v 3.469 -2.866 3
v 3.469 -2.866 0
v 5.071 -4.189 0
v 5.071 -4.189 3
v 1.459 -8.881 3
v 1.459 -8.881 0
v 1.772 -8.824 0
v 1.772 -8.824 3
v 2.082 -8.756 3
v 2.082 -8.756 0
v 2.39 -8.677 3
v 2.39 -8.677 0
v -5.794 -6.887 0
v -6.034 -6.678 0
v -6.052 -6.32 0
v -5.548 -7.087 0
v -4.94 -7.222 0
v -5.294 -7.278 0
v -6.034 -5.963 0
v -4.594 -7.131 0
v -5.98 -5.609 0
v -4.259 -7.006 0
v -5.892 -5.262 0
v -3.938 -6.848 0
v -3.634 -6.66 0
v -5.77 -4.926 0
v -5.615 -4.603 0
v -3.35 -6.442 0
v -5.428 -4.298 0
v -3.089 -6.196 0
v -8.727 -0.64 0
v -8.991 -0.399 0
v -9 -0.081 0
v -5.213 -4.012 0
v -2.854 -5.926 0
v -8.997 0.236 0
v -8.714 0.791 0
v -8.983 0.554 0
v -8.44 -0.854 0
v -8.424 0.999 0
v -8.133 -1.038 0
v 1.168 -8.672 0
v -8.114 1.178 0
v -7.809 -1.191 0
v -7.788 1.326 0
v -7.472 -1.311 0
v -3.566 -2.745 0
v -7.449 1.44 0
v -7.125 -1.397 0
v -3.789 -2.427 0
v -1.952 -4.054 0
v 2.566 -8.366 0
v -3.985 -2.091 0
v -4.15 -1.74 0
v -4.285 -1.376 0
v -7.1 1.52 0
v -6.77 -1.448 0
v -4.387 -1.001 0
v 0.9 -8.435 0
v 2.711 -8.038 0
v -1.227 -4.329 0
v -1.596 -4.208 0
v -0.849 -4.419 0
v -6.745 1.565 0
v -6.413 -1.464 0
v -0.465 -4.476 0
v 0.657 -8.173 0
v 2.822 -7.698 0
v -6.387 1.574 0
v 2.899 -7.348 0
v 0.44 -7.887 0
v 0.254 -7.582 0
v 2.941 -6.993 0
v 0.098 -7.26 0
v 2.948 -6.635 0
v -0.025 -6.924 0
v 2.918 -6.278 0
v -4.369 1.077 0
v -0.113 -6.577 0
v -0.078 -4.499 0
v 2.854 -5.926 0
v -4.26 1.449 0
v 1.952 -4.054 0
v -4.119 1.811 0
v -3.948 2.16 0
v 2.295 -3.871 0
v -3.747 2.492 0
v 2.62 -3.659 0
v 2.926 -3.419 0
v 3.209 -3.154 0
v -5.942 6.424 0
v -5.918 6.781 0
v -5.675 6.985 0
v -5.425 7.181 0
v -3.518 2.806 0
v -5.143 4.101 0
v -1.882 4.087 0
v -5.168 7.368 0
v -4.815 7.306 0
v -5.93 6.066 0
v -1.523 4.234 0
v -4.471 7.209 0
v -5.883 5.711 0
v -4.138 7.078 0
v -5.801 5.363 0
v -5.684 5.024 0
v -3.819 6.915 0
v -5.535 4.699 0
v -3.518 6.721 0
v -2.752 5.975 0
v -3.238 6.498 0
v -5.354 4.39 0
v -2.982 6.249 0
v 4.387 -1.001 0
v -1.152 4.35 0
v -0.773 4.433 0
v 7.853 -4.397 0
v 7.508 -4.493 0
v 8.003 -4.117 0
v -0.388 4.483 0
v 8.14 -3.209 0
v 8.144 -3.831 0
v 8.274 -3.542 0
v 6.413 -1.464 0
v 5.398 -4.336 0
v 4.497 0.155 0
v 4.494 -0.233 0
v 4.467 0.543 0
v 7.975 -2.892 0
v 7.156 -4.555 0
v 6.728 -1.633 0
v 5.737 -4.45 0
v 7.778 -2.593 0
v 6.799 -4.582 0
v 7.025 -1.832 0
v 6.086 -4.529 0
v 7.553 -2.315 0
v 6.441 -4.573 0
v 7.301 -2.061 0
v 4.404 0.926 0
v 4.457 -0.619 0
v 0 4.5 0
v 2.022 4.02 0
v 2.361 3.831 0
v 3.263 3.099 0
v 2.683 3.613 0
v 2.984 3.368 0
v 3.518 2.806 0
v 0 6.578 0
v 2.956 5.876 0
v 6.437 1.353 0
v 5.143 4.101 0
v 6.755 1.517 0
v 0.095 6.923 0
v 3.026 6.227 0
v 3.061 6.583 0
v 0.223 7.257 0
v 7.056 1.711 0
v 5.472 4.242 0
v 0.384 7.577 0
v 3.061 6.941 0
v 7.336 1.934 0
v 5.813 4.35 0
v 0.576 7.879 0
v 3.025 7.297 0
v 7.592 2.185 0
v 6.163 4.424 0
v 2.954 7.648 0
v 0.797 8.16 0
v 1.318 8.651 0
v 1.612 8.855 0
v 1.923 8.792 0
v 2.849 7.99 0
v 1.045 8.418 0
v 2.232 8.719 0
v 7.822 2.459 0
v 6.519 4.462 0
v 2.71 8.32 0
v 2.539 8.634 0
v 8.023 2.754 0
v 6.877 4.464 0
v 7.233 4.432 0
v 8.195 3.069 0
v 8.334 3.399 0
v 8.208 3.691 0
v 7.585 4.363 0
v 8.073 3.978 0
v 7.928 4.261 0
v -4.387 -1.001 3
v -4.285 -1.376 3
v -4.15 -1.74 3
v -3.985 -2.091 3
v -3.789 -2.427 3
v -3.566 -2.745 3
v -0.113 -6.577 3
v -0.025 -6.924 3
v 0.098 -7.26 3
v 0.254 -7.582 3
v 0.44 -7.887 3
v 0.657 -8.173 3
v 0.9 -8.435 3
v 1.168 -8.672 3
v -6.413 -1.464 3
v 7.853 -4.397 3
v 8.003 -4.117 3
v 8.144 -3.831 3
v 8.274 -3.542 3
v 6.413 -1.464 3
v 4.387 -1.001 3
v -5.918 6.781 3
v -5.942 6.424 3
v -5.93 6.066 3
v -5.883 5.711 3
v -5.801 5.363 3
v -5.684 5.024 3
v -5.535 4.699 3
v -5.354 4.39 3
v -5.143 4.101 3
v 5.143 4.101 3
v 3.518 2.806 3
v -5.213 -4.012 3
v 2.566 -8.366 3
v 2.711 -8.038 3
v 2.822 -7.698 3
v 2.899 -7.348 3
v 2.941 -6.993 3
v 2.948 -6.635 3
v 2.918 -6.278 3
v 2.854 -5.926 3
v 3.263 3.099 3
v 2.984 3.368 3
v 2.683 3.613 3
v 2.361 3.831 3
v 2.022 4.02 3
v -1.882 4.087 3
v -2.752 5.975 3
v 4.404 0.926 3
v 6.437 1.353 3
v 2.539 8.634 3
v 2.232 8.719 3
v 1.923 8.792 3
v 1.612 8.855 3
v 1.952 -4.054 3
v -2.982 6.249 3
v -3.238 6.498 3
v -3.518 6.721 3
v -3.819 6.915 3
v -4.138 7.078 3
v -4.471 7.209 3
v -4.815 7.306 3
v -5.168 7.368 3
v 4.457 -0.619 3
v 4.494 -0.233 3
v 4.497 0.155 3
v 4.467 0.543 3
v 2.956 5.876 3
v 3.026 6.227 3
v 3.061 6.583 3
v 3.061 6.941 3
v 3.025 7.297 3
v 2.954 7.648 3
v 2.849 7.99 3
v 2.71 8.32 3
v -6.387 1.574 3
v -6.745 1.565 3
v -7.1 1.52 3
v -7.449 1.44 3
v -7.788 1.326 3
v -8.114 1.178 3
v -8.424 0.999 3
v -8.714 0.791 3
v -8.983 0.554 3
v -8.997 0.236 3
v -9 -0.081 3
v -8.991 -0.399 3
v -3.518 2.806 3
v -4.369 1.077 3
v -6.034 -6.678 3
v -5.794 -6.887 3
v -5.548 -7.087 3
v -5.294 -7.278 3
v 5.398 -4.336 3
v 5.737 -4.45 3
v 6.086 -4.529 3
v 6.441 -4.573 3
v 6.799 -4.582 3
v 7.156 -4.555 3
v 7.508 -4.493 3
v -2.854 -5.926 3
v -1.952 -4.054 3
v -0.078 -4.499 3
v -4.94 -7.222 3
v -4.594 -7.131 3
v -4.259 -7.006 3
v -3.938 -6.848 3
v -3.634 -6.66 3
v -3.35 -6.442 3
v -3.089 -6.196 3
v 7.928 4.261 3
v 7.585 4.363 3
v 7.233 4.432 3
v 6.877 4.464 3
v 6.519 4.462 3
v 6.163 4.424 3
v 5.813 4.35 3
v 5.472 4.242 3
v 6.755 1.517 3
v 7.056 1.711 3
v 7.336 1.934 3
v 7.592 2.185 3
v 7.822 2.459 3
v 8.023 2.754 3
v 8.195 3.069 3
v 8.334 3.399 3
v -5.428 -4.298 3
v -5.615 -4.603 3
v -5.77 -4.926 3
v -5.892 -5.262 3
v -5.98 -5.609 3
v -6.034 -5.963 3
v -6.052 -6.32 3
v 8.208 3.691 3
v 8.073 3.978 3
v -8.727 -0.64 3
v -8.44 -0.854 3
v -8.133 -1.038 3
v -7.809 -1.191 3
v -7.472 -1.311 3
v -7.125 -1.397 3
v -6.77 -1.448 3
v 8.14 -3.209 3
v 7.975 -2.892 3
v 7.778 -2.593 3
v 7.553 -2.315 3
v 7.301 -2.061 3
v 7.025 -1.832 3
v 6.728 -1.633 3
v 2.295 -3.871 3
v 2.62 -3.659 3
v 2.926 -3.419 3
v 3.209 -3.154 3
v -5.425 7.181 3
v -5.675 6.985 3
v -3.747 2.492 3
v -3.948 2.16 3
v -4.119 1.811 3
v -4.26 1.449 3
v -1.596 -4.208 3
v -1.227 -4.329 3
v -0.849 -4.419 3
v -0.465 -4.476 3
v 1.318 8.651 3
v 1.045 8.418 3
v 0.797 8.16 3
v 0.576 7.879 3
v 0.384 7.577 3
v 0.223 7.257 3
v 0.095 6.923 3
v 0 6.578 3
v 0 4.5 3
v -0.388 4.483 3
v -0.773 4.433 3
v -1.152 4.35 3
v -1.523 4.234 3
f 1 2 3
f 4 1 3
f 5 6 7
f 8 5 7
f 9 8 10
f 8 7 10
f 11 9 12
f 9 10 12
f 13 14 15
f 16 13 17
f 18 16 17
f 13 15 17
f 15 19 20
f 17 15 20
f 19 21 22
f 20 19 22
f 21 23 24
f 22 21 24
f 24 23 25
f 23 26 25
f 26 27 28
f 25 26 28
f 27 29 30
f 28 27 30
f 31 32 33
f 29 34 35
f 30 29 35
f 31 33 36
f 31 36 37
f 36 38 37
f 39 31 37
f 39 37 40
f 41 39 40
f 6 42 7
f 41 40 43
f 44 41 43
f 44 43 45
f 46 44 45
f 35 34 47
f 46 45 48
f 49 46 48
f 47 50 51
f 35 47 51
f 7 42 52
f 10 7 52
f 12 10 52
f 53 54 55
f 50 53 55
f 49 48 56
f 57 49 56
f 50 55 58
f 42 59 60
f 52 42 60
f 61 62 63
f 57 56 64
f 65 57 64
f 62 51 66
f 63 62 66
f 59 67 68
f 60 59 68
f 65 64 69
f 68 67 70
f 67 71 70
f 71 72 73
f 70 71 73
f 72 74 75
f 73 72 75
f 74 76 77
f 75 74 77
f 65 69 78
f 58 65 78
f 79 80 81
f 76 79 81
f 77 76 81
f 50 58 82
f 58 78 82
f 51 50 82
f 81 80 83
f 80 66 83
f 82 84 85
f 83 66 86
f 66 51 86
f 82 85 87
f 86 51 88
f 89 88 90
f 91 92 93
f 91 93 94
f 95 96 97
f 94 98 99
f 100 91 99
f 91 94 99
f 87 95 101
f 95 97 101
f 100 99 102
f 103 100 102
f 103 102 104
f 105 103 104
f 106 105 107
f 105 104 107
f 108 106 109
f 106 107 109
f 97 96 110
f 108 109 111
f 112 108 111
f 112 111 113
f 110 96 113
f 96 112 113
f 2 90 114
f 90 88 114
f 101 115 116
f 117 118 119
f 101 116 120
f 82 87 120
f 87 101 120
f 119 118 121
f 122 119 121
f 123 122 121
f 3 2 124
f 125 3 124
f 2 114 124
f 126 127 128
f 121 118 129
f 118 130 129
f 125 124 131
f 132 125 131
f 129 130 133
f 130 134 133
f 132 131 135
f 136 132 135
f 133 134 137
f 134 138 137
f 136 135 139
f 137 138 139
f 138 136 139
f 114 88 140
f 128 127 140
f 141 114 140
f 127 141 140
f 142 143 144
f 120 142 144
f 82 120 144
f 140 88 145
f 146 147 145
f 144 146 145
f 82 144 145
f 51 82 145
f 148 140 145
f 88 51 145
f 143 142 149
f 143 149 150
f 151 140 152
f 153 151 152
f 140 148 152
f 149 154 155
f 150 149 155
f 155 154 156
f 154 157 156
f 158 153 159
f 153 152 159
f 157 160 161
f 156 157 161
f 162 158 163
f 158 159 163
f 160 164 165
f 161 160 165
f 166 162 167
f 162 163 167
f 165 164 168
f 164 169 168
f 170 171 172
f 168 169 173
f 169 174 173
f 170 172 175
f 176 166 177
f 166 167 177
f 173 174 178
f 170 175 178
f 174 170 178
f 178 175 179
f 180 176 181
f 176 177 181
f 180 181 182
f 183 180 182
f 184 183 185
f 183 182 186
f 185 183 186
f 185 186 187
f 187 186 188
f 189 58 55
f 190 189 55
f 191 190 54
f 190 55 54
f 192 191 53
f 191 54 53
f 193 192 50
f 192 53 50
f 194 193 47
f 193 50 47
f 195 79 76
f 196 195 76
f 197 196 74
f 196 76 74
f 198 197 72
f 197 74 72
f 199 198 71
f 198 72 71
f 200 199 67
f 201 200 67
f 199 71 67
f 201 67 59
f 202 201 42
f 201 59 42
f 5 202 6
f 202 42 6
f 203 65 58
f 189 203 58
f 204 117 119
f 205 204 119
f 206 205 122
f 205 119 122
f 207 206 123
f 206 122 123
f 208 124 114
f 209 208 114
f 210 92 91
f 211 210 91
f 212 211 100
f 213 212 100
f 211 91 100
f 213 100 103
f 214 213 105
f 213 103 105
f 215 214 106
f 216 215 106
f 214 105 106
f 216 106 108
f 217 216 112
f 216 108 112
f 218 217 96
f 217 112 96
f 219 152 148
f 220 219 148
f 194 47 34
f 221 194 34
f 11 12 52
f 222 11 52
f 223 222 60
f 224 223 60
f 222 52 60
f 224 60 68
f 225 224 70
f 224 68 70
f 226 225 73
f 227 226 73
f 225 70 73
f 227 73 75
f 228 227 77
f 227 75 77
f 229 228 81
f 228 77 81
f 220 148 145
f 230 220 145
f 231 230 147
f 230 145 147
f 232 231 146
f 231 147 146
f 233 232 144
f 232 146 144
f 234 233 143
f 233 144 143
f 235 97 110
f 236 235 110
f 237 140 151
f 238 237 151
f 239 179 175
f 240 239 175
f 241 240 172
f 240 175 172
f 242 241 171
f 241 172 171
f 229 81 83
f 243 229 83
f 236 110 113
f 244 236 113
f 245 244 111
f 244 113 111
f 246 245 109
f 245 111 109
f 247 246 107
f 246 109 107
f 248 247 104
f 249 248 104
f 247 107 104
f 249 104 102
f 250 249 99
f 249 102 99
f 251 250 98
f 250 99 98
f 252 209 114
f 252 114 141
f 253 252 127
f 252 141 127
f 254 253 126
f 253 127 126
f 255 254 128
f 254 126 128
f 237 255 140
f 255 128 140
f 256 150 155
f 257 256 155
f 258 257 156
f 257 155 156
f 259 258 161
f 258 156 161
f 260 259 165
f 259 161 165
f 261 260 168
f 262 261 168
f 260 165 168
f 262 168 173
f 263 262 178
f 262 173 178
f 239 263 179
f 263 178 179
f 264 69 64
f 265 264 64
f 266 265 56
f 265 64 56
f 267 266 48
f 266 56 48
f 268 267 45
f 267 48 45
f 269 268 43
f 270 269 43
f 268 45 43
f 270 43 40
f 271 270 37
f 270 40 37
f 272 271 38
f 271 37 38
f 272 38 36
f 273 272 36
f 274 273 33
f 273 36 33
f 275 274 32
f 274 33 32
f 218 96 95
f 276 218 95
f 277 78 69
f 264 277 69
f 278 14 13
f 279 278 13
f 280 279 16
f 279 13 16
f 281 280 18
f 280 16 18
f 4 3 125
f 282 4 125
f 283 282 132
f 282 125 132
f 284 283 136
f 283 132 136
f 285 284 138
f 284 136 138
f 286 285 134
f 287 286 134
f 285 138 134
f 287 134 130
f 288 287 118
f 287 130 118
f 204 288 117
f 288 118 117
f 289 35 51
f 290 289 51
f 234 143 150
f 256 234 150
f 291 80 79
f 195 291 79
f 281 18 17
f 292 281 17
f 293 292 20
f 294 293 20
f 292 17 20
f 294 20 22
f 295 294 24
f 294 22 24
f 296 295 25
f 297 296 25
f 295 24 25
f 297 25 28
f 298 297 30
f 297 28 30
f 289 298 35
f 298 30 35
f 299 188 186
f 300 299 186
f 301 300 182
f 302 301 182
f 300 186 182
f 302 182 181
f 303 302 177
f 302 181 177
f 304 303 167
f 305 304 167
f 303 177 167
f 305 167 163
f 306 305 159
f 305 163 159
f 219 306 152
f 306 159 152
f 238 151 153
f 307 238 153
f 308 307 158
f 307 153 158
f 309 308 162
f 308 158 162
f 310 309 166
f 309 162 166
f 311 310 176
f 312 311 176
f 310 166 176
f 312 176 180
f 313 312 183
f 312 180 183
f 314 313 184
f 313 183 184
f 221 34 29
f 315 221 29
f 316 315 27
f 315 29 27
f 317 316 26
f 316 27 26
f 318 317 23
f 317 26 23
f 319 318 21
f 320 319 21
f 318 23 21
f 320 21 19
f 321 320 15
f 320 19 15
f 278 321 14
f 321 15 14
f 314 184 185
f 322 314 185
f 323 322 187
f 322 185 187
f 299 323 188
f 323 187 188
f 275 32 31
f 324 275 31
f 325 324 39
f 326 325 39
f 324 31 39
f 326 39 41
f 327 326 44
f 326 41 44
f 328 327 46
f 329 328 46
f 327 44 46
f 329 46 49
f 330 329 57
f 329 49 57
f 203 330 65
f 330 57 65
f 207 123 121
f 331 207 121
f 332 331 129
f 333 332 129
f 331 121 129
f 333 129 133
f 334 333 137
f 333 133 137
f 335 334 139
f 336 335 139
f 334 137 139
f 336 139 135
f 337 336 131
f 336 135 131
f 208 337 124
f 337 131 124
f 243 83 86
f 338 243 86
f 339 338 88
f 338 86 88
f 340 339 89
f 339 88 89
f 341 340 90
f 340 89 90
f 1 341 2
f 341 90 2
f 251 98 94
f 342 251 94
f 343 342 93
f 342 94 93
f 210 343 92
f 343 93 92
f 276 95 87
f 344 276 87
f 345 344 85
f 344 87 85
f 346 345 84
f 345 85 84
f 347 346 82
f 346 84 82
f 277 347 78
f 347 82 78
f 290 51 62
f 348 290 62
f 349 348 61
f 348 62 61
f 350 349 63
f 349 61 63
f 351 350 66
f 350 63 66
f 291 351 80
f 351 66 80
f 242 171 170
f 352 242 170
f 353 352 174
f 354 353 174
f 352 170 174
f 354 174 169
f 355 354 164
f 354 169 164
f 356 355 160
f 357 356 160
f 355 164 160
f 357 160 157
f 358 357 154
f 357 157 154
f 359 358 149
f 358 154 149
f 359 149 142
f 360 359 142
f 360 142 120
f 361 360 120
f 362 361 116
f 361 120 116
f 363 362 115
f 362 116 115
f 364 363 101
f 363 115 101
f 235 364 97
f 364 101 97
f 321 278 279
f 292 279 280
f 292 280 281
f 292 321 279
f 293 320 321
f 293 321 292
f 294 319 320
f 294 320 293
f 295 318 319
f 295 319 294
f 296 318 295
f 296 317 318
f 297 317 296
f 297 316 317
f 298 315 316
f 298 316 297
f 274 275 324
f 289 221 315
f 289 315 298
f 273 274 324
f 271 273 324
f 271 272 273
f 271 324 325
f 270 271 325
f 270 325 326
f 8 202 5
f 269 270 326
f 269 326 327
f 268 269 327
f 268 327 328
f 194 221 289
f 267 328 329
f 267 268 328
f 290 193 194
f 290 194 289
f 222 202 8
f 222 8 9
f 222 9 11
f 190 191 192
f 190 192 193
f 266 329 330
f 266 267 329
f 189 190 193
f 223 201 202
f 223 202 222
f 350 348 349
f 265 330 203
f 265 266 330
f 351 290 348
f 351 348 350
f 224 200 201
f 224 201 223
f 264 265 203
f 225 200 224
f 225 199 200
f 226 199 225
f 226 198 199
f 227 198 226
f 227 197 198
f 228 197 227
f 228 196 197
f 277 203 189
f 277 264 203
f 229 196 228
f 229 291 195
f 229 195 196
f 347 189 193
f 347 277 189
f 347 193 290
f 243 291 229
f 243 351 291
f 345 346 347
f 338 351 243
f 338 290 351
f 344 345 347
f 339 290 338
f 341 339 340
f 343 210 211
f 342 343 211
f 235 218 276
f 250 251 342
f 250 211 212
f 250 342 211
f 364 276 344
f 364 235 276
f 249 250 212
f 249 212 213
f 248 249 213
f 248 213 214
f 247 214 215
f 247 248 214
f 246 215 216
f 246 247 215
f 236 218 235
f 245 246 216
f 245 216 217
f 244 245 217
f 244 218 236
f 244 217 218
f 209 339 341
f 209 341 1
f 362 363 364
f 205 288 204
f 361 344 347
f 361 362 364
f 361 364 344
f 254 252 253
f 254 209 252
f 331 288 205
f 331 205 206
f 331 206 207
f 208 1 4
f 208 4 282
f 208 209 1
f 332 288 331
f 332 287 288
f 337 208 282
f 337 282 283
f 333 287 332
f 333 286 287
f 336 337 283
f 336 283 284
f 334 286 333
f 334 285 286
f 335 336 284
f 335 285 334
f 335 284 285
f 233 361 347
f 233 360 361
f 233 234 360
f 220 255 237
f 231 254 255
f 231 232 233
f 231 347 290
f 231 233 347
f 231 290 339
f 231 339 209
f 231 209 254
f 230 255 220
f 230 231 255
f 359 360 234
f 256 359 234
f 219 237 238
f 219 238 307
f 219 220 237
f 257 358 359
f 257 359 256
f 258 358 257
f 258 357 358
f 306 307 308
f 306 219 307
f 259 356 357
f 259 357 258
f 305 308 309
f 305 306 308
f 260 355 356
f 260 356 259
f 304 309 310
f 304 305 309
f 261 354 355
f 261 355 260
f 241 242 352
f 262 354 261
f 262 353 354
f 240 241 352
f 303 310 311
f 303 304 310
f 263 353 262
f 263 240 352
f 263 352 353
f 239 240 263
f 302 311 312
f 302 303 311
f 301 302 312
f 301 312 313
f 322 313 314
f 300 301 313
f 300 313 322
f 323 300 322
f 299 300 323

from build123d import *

# Parameters (mm, degrees)
BOSS_EXTRU_1_DEPTH           = 3
R_P_TITION_CIRCULAIRE2_COUNT = 7
ESQUISSE5_R                  = 4.5
BOSS_EXTRU_2_DEPTH           = 3


with BuildPart() as part:
    # Esquisse4 → Boss.-Extru.1 (new body)
    with BuildSketch(Plane.XY):
        with BuildLine():
            Line((0, 6.577848346), (0, 4.5))
            ThreePointArc((0, 4.5), (1.039097311, 4.378387463), (2.022031395, 4.020123013))
            Line((2.022031395, 4.020123013), (2.955692415, 5.876391002))
            ThreePointArc((2.955692415, 5.876391002), (3.02541978, 7.297456647), (2.538901994, 8.634464469))
            ThreePointArc((2.538901994, 8.634464469), (2.078194622, 8.756774927), (1.611657757, 8.854521968))
            ThreePointArc((1.611657757, 8.854521968), (0.576250392, 7.878703818), (0, 6.577848346))
        make_face()
    extrude(amount=BOSS_EXTRU_1_DEPTH)


with BuildPart() as r_p_tition_circulaire2_1:
    # Répétition circulaire2: pattern copy
    add(part.part.rotate(Axis((0, 0, 0), (0, 0, 1)), 1 * 360 / R_P_TITION_CIRCULAIRE2_COUNT))


with BuildPart() as r_p_tition_circulaire2_2:
    # Répétition circulaire2: pattern copy
    add(part.part.rotate(Axis((0, 0, 0), (0, 0, 1)), 2 * 360 / R_P_TITION_CIRCULAIRE2_COUNT))


with BuildPart() as r_p_tition_circulaire2_3:
    # Répétition circulaire2: pattern copy
    add(part.part.rotate(Axis((0, 0, 0), (0, 0, 1)), 3 * 360 / R_P_TITION_CIRCULAIRE2_COUNT))


with BuildPart() as r_p_tition_circulaire2_4:
    # Répétition circulaire2: pattern copy
    add(part.part.rotate(Axis((0, 0, 0), (0, 0, 1)), 4 * 360 / R_P_TITION_CIRCULAIRE2_COUNT))


with BuildPart() as r_p_tition_circulaire2_5:
    # Répétition circulaire2: pattern copy
    add(part.part.rotate(Axis((0, 0, 0), (0, 0, 1)), 5 * 360 / R_P_TITION_CIRCULAIRE2_COUNT))


with BuildPart() as r_p_tition_circulaire2_6:
    # Répétition circulaire2: pattern copy
    add(part.part.rotate(Axis((0, 0, 0), (0, 0, 1)), 6 * 360 / R_P_TITION_CIRCULAIRE2_COUNT))


with BuildPart() as part_1:
    add(part.part)

    add(r_p_tition_circulaire2_1.part)  # Boss.-Extru.2 merges Répétition circulaire2_1

    add(r_p_tition_circulaire2_2.part)  # Boss.-Extru.2 merges Répétition circulaire2_2

    add(r_p_tition_circulaire2_3.part)  # Boss.-Extru.2 merges Répétition circulaire2_3

    add(r_p_tition_circulaire2_4.part)  # Boss.-Extru.2 merges Répétition circulaire2_4

    add(r_p_tition_circulaire2_5.part)  # Boss.-Extru.2 merges Répétition circulaire2_5

    add(r_p_tition_circulaire2_6.part)  # Boss.-Extru.2 merges Répétition circulaire2_6
    # Esquisse5 → Boss.-Extru.2 (add)
    with BuildSketch(Plane.XY):
        Circle(ESQUISSE5_R)
    extrude(amount=BOSS_EXTRU_2_DEPTH)


solid = part_1.part
